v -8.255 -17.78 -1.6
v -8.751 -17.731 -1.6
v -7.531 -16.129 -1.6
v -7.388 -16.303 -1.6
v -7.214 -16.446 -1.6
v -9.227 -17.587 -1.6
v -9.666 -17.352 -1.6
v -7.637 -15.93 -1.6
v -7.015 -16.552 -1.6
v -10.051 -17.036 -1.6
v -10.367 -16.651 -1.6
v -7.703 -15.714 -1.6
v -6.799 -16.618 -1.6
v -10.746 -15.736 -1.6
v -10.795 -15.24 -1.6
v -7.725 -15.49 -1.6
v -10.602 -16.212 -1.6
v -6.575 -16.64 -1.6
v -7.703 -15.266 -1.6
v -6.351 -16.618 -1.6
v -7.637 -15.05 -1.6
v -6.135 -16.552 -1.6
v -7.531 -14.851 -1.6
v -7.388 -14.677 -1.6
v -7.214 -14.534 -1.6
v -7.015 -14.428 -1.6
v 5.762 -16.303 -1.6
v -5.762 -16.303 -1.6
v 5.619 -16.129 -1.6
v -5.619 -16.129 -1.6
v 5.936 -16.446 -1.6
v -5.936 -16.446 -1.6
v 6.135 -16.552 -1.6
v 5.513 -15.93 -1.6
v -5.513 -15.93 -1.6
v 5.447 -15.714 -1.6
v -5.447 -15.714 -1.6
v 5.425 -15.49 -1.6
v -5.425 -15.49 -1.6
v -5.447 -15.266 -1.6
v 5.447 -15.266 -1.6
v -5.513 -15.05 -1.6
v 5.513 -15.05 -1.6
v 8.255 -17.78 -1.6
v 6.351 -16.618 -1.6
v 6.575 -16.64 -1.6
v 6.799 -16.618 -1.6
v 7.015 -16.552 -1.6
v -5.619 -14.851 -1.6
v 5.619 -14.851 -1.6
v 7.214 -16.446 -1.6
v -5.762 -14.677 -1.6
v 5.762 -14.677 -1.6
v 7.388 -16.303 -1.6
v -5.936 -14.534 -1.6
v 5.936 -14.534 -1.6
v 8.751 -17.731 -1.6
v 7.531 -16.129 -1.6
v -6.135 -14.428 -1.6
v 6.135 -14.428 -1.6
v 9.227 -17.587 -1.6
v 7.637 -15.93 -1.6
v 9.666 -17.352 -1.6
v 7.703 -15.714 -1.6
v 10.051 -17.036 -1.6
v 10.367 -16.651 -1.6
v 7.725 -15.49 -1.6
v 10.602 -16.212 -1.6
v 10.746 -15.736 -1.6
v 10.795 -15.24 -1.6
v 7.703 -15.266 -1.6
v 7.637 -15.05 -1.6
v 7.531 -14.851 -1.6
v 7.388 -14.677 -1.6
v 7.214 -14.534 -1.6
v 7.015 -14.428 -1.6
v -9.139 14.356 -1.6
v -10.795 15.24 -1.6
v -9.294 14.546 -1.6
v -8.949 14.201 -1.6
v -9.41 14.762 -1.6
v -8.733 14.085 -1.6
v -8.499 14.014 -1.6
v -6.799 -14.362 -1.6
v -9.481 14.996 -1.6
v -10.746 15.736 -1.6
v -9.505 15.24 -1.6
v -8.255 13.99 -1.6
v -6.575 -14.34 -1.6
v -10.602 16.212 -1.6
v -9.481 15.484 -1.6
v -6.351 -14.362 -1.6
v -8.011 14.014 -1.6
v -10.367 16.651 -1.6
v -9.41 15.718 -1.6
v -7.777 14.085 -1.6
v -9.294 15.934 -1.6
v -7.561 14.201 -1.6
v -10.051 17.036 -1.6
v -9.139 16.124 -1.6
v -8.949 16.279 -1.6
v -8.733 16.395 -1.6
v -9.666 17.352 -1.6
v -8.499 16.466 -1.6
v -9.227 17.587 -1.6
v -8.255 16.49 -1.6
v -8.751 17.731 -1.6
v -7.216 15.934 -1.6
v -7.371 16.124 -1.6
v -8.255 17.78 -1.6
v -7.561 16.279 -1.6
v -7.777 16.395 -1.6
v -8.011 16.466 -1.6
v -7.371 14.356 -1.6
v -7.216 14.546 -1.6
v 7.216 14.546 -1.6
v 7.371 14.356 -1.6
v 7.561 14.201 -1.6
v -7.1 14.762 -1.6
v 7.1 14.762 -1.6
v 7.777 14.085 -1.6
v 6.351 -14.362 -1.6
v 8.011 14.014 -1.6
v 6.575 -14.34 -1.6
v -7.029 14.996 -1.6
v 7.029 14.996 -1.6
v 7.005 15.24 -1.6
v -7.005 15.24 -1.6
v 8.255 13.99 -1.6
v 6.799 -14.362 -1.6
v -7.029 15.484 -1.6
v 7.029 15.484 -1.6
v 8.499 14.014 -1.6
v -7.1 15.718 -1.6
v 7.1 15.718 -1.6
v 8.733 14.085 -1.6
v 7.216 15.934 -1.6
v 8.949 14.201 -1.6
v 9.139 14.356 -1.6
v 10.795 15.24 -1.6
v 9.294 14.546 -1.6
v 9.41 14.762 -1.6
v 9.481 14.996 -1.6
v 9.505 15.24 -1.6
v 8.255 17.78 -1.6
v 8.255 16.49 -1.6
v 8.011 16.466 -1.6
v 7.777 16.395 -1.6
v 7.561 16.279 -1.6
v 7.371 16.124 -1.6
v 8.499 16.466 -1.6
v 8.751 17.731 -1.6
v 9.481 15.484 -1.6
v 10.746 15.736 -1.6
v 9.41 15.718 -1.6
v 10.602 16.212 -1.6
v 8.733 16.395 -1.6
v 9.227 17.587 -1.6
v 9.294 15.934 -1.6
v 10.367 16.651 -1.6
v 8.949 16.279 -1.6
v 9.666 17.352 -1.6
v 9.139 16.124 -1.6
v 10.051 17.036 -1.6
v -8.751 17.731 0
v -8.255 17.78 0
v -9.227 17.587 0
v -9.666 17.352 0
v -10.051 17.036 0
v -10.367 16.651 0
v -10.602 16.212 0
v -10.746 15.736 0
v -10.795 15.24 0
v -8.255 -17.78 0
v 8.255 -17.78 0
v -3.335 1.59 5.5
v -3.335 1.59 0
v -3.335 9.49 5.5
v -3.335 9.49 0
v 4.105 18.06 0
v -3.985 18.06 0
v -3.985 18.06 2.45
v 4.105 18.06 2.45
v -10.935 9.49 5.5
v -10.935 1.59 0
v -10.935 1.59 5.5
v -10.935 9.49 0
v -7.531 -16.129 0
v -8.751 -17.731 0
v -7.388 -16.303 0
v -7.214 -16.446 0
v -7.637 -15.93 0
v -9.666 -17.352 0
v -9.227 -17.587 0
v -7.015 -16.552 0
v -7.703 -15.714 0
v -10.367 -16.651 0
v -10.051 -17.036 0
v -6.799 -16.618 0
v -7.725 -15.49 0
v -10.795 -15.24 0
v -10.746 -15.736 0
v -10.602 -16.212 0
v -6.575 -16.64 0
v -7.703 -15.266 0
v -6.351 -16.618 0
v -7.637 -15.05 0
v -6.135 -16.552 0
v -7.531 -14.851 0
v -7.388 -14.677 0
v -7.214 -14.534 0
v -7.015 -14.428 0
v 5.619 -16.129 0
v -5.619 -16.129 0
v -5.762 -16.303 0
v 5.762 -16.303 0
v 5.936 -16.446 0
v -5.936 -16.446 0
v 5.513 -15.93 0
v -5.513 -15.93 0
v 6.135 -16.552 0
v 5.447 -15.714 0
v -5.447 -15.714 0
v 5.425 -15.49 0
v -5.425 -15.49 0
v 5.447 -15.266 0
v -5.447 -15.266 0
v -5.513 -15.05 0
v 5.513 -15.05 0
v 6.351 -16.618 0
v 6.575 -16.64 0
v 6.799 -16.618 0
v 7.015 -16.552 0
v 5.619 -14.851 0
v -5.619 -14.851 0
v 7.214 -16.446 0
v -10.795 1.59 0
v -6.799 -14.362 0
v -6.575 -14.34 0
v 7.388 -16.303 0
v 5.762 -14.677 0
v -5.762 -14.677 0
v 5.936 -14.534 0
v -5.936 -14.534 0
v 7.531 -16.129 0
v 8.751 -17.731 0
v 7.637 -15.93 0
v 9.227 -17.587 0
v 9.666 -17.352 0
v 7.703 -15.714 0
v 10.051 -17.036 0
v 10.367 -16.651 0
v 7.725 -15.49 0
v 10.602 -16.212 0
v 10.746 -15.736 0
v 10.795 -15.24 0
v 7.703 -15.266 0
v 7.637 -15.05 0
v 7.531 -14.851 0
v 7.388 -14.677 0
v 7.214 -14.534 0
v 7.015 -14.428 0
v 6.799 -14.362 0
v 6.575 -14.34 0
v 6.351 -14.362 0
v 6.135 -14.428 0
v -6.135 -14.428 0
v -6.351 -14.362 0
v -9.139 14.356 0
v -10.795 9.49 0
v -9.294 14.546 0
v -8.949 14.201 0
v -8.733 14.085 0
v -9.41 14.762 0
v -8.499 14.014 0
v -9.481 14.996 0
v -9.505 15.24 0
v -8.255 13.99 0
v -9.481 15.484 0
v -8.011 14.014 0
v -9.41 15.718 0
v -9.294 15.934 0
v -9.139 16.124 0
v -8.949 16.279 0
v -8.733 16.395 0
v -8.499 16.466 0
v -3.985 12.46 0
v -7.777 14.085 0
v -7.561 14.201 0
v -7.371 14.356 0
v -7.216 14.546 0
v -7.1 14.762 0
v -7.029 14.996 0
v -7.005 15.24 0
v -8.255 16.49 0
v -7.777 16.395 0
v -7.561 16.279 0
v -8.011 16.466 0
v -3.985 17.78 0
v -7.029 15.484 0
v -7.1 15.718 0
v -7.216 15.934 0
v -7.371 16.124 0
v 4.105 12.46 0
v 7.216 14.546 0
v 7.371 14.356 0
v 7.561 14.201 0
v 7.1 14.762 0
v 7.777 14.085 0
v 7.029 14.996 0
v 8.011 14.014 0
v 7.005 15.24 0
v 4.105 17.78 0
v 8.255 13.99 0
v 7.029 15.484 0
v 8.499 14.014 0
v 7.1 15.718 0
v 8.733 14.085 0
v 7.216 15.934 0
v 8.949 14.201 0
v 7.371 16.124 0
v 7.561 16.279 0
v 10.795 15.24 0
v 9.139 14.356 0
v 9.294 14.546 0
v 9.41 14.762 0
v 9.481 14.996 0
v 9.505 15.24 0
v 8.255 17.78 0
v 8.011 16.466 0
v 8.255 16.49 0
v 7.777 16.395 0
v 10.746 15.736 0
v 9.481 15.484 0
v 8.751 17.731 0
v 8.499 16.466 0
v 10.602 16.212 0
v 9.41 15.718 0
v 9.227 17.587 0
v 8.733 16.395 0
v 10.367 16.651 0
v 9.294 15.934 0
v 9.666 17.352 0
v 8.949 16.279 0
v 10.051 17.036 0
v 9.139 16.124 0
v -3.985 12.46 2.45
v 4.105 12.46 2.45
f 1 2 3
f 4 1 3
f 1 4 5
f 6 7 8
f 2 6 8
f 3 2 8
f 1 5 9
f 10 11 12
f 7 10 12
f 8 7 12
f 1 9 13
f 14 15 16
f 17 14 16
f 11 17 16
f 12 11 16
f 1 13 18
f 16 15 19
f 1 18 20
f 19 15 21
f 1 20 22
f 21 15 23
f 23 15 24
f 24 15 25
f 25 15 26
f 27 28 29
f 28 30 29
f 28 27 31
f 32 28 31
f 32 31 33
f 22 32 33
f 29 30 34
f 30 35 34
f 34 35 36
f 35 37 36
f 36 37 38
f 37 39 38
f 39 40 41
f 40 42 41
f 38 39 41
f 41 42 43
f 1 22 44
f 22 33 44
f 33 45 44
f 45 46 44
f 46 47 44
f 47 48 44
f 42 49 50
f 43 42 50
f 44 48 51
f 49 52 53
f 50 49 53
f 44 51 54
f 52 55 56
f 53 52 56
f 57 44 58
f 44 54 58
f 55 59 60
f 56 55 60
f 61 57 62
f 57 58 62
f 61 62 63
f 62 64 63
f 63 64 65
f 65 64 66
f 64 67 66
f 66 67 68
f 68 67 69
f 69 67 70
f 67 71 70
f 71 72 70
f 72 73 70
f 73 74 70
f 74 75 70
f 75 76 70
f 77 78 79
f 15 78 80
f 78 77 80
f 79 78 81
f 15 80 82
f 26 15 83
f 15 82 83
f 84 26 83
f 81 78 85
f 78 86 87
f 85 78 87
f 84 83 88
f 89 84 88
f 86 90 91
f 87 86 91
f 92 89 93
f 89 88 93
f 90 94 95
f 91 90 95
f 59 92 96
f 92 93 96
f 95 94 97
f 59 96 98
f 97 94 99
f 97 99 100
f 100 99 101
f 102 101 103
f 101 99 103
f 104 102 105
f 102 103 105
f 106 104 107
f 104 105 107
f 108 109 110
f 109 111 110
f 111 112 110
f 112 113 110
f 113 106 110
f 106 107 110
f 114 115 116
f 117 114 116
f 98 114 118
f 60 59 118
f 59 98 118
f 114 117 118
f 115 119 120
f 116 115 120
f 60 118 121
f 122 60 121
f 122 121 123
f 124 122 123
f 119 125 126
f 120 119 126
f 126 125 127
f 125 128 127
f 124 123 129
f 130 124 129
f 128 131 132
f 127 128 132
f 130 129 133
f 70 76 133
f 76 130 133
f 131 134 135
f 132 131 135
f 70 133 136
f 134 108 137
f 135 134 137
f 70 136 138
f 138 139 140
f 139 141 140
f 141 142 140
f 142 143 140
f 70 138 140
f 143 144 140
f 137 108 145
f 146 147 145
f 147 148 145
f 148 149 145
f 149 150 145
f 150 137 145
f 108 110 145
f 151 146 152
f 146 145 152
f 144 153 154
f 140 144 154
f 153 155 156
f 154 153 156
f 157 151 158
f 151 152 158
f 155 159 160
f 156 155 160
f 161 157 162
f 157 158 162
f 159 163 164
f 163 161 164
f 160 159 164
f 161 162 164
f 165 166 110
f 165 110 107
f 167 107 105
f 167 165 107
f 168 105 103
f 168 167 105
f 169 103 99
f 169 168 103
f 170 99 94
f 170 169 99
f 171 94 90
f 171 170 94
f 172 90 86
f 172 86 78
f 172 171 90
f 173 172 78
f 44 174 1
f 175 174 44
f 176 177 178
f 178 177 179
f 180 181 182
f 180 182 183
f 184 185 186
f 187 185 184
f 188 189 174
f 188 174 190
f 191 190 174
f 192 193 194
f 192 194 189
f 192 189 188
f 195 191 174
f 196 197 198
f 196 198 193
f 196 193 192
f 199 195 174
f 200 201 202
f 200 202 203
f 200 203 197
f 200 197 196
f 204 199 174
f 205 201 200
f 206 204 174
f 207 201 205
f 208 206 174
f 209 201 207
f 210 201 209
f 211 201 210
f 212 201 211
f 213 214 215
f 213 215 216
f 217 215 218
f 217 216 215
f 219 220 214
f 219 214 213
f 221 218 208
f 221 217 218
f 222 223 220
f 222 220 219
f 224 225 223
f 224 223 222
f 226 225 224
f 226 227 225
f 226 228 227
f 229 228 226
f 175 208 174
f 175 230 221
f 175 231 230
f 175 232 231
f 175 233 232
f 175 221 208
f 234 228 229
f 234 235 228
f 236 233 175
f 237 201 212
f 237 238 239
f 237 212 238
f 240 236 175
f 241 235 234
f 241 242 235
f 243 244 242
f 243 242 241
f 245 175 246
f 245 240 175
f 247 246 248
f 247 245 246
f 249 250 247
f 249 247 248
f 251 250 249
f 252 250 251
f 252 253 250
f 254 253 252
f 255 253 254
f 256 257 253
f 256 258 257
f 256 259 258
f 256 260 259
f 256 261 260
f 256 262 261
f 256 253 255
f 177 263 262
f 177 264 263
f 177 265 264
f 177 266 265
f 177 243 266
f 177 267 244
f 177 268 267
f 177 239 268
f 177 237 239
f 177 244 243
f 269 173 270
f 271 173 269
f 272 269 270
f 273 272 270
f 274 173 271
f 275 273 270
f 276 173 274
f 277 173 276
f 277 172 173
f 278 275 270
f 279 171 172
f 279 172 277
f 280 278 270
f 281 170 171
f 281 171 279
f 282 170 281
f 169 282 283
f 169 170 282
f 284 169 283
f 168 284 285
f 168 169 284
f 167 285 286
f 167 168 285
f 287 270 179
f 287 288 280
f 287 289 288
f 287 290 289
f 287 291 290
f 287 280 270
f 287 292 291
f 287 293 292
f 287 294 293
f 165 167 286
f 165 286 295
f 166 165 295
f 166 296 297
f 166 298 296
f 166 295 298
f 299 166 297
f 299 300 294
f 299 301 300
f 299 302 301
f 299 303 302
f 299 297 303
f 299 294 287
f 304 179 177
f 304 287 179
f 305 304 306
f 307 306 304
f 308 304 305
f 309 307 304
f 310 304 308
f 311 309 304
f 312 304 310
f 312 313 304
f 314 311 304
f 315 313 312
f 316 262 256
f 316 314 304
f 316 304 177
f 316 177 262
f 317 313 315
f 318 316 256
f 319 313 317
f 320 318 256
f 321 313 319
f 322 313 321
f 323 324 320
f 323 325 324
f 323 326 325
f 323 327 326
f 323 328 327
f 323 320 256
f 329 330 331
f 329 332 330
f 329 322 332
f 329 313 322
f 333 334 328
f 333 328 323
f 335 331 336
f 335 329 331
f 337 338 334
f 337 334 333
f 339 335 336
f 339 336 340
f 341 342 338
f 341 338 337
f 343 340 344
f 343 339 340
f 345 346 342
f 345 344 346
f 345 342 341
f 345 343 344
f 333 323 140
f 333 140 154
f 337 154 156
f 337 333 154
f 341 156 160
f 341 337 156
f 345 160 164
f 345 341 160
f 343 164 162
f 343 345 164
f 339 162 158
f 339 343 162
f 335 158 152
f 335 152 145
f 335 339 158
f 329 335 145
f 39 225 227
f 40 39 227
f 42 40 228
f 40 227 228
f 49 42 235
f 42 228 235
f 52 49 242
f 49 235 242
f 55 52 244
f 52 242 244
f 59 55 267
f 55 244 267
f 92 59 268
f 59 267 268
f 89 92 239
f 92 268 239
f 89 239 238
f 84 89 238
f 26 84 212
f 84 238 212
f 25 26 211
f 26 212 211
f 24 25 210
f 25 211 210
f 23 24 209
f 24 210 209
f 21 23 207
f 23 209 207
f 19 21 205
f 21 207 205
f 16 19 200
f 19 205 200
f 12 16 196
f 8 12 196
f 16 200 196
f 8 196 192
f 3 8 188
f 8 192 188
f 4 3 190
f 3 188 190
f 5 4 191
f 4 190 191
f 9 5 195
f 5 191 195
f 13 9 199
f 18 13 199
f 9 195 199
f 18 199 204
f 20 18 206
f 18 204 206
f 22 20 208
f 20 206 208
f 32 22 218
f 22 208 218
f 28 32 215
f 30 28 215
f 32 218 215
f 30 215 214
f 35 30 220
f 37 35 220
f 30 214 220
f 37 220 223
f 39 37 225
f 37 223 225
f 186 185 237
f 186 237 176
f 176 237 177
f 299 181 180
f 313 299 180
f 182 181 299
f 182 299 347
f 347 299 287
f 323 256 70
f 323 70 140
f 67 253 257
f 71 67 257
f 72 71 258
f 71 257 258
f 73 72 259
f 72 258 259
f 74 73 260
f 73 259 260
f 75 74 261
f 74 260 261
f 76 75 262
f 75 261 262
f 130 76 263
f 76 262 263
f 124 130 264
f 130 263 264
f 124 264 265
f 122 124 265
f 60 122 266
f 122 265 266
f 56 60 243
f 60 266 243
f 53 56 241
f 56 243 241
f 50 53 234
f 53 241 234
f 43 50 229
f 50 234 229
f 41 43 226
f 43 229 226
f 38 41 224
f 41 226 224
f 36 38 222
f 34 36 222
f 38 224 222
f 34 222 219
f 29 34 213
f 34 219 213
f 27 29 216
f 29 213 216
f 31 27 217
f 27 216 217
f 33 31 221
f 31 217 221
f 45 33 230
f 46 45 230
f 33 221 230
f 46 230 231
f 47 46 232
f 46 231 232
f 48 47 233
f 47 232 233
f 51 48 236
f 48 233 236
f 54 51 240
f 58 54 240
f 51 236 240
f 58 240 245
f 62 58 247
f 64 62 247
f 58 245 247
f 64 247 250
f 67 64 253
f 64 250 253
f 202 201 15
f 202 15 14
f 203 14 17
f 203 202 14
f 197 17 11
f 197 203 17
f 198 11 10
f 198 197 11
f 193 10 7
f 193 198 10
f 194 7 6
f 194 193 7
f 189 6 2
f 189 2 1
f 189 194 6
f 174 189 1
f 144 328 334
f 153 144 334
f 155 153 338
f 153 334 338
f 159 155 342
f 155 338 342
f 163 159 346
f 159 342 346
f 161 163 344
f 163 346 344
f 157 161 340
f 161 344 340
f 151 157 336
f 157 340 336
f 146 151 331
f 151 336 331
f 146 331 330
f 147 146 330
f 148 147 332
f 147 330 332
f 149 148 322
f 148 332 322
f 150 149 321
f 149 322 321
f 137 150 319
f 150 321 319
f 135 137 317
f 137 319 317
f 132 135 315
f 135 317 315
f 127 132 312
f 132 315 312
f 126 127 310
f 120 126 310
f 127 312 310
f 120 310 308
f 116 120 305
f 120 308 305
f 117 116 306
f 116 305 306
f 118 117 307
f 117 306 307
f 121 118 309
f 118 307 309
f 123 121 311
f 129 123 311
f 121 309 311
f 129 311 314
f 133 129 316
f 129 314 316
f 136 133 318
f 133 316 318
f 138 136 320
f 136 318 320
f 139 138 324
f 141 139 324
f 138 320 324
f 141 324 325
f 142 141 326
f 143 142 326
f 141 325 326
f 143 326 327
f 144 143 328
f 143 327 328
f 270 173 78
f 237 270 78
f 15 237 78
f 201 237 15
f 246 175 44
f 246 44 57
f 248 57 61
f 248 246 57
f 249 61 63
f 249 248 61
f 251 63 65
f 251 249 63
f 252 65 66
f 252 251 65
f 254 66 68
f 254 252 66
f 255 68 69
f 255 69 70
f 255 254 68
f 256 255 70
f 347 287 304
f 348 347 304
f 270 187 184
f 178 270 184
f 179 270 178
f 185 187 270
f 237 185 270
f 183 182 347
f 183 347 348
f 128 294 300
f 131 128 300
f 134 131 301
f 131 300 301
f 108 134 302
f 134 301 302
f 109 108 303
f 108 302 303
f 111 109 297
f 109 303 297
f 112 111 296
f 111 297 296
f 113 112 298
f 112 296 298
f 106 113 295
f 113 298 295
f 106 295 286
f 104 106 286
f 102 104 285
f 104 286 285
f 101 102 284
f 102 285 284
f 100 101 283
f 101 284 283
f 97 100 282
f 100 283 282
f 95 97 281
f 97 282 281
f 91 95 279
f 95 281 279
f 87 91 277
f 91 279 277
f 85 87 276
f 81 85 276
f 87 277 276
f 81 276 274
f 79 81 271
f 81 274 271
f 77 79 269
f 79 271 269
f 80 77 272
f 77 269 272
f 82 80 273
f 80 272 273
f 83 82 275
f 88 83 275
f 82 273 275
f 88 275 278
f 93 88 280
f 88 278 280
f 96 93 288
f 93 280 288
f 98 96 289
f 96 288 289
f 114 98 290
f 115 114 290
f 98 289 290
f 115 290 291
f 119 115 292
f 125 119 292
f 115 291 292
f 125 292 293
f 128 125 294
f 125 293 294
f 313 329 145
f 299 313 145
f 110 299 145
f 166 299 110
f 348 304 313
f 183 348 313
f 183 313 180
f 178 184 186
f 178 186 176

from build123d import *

# Parameters (mm, degrees)
F0_R     = 1.15
F0_R_2   = 1.25
F1_DEPTH = 1.6
F2_W     = 7.6
F2_H     = 7.9
F3_DEPTH = 5.5
F4_W     = 8.09
F4_H     = 0.28
F4_H_2   = 5.32
F5_DEPTH = 2.45


with BuildPart() as f1:
    # F0 (on Top) → F1 (new body)
    with BuildSketch(Plane.XY):
        with BuildLine():
            ThreePointArc((10.795, 15.24), (10.051051, 17.036051), (8.255, 17.78))
            Line((8.255, 17.78), (-8.255, 17.78))
            ThreePointArc((-8.255, 17.78), (-10.051051, 17.036051), (-10.795, 15.24))
            Line((-10.795, 15.24), (-10.795, -15.24))
            ThreePointArc((-10.795, -15.24), (-10.051051, -17.036051), (-8.255, -17.78))
            Line((-8.255, -17.78), (8.255, -17.78))
            ThreePointArc((8.255, -17.78), (10.051051, -17.036051), (10.795, -15.24))
            Line((10.795, -15.24), (10.795, 15.24))
        make_face()
        with Locations((-6.575, -15.49)):
            Circle(F0_R, mode=Mode.SUBTRACT)
        with Locations((6.575, -15.49)):
            Circle(F0_R, mode=Mode.SUBTRACT)
        with Locations((-8.255, 15.24)):
            Circle(F0_R_2, mode=Mode.SUBTRACT)
        with Locations((8.255, 15.24)):
            Circle(F0_R_2, mode=Mode.SUBTRACT)
    extrude(amount=-F1_DEPTH)

    # F2 (on Top) → F3 (join)
    with BuildSketch(Plane.XY):
        with Locations((-7.135, 5.54)):
            Rectangle(F2_W, F2_H)
    extrude(amount=F3_DEPTH)

    # F4 (on face) → F5 (join)
    with BuildSketch(Plane.XY):
        with Locations((0.06, 17.92)):
            Rectangle(F4_W, F4_H)
        with Locations((0.06, 15.12)):
            Rectangle(F4_W, F4_H_2)
    extrude(amount=F5_DEPTH)


solid = f1.part
